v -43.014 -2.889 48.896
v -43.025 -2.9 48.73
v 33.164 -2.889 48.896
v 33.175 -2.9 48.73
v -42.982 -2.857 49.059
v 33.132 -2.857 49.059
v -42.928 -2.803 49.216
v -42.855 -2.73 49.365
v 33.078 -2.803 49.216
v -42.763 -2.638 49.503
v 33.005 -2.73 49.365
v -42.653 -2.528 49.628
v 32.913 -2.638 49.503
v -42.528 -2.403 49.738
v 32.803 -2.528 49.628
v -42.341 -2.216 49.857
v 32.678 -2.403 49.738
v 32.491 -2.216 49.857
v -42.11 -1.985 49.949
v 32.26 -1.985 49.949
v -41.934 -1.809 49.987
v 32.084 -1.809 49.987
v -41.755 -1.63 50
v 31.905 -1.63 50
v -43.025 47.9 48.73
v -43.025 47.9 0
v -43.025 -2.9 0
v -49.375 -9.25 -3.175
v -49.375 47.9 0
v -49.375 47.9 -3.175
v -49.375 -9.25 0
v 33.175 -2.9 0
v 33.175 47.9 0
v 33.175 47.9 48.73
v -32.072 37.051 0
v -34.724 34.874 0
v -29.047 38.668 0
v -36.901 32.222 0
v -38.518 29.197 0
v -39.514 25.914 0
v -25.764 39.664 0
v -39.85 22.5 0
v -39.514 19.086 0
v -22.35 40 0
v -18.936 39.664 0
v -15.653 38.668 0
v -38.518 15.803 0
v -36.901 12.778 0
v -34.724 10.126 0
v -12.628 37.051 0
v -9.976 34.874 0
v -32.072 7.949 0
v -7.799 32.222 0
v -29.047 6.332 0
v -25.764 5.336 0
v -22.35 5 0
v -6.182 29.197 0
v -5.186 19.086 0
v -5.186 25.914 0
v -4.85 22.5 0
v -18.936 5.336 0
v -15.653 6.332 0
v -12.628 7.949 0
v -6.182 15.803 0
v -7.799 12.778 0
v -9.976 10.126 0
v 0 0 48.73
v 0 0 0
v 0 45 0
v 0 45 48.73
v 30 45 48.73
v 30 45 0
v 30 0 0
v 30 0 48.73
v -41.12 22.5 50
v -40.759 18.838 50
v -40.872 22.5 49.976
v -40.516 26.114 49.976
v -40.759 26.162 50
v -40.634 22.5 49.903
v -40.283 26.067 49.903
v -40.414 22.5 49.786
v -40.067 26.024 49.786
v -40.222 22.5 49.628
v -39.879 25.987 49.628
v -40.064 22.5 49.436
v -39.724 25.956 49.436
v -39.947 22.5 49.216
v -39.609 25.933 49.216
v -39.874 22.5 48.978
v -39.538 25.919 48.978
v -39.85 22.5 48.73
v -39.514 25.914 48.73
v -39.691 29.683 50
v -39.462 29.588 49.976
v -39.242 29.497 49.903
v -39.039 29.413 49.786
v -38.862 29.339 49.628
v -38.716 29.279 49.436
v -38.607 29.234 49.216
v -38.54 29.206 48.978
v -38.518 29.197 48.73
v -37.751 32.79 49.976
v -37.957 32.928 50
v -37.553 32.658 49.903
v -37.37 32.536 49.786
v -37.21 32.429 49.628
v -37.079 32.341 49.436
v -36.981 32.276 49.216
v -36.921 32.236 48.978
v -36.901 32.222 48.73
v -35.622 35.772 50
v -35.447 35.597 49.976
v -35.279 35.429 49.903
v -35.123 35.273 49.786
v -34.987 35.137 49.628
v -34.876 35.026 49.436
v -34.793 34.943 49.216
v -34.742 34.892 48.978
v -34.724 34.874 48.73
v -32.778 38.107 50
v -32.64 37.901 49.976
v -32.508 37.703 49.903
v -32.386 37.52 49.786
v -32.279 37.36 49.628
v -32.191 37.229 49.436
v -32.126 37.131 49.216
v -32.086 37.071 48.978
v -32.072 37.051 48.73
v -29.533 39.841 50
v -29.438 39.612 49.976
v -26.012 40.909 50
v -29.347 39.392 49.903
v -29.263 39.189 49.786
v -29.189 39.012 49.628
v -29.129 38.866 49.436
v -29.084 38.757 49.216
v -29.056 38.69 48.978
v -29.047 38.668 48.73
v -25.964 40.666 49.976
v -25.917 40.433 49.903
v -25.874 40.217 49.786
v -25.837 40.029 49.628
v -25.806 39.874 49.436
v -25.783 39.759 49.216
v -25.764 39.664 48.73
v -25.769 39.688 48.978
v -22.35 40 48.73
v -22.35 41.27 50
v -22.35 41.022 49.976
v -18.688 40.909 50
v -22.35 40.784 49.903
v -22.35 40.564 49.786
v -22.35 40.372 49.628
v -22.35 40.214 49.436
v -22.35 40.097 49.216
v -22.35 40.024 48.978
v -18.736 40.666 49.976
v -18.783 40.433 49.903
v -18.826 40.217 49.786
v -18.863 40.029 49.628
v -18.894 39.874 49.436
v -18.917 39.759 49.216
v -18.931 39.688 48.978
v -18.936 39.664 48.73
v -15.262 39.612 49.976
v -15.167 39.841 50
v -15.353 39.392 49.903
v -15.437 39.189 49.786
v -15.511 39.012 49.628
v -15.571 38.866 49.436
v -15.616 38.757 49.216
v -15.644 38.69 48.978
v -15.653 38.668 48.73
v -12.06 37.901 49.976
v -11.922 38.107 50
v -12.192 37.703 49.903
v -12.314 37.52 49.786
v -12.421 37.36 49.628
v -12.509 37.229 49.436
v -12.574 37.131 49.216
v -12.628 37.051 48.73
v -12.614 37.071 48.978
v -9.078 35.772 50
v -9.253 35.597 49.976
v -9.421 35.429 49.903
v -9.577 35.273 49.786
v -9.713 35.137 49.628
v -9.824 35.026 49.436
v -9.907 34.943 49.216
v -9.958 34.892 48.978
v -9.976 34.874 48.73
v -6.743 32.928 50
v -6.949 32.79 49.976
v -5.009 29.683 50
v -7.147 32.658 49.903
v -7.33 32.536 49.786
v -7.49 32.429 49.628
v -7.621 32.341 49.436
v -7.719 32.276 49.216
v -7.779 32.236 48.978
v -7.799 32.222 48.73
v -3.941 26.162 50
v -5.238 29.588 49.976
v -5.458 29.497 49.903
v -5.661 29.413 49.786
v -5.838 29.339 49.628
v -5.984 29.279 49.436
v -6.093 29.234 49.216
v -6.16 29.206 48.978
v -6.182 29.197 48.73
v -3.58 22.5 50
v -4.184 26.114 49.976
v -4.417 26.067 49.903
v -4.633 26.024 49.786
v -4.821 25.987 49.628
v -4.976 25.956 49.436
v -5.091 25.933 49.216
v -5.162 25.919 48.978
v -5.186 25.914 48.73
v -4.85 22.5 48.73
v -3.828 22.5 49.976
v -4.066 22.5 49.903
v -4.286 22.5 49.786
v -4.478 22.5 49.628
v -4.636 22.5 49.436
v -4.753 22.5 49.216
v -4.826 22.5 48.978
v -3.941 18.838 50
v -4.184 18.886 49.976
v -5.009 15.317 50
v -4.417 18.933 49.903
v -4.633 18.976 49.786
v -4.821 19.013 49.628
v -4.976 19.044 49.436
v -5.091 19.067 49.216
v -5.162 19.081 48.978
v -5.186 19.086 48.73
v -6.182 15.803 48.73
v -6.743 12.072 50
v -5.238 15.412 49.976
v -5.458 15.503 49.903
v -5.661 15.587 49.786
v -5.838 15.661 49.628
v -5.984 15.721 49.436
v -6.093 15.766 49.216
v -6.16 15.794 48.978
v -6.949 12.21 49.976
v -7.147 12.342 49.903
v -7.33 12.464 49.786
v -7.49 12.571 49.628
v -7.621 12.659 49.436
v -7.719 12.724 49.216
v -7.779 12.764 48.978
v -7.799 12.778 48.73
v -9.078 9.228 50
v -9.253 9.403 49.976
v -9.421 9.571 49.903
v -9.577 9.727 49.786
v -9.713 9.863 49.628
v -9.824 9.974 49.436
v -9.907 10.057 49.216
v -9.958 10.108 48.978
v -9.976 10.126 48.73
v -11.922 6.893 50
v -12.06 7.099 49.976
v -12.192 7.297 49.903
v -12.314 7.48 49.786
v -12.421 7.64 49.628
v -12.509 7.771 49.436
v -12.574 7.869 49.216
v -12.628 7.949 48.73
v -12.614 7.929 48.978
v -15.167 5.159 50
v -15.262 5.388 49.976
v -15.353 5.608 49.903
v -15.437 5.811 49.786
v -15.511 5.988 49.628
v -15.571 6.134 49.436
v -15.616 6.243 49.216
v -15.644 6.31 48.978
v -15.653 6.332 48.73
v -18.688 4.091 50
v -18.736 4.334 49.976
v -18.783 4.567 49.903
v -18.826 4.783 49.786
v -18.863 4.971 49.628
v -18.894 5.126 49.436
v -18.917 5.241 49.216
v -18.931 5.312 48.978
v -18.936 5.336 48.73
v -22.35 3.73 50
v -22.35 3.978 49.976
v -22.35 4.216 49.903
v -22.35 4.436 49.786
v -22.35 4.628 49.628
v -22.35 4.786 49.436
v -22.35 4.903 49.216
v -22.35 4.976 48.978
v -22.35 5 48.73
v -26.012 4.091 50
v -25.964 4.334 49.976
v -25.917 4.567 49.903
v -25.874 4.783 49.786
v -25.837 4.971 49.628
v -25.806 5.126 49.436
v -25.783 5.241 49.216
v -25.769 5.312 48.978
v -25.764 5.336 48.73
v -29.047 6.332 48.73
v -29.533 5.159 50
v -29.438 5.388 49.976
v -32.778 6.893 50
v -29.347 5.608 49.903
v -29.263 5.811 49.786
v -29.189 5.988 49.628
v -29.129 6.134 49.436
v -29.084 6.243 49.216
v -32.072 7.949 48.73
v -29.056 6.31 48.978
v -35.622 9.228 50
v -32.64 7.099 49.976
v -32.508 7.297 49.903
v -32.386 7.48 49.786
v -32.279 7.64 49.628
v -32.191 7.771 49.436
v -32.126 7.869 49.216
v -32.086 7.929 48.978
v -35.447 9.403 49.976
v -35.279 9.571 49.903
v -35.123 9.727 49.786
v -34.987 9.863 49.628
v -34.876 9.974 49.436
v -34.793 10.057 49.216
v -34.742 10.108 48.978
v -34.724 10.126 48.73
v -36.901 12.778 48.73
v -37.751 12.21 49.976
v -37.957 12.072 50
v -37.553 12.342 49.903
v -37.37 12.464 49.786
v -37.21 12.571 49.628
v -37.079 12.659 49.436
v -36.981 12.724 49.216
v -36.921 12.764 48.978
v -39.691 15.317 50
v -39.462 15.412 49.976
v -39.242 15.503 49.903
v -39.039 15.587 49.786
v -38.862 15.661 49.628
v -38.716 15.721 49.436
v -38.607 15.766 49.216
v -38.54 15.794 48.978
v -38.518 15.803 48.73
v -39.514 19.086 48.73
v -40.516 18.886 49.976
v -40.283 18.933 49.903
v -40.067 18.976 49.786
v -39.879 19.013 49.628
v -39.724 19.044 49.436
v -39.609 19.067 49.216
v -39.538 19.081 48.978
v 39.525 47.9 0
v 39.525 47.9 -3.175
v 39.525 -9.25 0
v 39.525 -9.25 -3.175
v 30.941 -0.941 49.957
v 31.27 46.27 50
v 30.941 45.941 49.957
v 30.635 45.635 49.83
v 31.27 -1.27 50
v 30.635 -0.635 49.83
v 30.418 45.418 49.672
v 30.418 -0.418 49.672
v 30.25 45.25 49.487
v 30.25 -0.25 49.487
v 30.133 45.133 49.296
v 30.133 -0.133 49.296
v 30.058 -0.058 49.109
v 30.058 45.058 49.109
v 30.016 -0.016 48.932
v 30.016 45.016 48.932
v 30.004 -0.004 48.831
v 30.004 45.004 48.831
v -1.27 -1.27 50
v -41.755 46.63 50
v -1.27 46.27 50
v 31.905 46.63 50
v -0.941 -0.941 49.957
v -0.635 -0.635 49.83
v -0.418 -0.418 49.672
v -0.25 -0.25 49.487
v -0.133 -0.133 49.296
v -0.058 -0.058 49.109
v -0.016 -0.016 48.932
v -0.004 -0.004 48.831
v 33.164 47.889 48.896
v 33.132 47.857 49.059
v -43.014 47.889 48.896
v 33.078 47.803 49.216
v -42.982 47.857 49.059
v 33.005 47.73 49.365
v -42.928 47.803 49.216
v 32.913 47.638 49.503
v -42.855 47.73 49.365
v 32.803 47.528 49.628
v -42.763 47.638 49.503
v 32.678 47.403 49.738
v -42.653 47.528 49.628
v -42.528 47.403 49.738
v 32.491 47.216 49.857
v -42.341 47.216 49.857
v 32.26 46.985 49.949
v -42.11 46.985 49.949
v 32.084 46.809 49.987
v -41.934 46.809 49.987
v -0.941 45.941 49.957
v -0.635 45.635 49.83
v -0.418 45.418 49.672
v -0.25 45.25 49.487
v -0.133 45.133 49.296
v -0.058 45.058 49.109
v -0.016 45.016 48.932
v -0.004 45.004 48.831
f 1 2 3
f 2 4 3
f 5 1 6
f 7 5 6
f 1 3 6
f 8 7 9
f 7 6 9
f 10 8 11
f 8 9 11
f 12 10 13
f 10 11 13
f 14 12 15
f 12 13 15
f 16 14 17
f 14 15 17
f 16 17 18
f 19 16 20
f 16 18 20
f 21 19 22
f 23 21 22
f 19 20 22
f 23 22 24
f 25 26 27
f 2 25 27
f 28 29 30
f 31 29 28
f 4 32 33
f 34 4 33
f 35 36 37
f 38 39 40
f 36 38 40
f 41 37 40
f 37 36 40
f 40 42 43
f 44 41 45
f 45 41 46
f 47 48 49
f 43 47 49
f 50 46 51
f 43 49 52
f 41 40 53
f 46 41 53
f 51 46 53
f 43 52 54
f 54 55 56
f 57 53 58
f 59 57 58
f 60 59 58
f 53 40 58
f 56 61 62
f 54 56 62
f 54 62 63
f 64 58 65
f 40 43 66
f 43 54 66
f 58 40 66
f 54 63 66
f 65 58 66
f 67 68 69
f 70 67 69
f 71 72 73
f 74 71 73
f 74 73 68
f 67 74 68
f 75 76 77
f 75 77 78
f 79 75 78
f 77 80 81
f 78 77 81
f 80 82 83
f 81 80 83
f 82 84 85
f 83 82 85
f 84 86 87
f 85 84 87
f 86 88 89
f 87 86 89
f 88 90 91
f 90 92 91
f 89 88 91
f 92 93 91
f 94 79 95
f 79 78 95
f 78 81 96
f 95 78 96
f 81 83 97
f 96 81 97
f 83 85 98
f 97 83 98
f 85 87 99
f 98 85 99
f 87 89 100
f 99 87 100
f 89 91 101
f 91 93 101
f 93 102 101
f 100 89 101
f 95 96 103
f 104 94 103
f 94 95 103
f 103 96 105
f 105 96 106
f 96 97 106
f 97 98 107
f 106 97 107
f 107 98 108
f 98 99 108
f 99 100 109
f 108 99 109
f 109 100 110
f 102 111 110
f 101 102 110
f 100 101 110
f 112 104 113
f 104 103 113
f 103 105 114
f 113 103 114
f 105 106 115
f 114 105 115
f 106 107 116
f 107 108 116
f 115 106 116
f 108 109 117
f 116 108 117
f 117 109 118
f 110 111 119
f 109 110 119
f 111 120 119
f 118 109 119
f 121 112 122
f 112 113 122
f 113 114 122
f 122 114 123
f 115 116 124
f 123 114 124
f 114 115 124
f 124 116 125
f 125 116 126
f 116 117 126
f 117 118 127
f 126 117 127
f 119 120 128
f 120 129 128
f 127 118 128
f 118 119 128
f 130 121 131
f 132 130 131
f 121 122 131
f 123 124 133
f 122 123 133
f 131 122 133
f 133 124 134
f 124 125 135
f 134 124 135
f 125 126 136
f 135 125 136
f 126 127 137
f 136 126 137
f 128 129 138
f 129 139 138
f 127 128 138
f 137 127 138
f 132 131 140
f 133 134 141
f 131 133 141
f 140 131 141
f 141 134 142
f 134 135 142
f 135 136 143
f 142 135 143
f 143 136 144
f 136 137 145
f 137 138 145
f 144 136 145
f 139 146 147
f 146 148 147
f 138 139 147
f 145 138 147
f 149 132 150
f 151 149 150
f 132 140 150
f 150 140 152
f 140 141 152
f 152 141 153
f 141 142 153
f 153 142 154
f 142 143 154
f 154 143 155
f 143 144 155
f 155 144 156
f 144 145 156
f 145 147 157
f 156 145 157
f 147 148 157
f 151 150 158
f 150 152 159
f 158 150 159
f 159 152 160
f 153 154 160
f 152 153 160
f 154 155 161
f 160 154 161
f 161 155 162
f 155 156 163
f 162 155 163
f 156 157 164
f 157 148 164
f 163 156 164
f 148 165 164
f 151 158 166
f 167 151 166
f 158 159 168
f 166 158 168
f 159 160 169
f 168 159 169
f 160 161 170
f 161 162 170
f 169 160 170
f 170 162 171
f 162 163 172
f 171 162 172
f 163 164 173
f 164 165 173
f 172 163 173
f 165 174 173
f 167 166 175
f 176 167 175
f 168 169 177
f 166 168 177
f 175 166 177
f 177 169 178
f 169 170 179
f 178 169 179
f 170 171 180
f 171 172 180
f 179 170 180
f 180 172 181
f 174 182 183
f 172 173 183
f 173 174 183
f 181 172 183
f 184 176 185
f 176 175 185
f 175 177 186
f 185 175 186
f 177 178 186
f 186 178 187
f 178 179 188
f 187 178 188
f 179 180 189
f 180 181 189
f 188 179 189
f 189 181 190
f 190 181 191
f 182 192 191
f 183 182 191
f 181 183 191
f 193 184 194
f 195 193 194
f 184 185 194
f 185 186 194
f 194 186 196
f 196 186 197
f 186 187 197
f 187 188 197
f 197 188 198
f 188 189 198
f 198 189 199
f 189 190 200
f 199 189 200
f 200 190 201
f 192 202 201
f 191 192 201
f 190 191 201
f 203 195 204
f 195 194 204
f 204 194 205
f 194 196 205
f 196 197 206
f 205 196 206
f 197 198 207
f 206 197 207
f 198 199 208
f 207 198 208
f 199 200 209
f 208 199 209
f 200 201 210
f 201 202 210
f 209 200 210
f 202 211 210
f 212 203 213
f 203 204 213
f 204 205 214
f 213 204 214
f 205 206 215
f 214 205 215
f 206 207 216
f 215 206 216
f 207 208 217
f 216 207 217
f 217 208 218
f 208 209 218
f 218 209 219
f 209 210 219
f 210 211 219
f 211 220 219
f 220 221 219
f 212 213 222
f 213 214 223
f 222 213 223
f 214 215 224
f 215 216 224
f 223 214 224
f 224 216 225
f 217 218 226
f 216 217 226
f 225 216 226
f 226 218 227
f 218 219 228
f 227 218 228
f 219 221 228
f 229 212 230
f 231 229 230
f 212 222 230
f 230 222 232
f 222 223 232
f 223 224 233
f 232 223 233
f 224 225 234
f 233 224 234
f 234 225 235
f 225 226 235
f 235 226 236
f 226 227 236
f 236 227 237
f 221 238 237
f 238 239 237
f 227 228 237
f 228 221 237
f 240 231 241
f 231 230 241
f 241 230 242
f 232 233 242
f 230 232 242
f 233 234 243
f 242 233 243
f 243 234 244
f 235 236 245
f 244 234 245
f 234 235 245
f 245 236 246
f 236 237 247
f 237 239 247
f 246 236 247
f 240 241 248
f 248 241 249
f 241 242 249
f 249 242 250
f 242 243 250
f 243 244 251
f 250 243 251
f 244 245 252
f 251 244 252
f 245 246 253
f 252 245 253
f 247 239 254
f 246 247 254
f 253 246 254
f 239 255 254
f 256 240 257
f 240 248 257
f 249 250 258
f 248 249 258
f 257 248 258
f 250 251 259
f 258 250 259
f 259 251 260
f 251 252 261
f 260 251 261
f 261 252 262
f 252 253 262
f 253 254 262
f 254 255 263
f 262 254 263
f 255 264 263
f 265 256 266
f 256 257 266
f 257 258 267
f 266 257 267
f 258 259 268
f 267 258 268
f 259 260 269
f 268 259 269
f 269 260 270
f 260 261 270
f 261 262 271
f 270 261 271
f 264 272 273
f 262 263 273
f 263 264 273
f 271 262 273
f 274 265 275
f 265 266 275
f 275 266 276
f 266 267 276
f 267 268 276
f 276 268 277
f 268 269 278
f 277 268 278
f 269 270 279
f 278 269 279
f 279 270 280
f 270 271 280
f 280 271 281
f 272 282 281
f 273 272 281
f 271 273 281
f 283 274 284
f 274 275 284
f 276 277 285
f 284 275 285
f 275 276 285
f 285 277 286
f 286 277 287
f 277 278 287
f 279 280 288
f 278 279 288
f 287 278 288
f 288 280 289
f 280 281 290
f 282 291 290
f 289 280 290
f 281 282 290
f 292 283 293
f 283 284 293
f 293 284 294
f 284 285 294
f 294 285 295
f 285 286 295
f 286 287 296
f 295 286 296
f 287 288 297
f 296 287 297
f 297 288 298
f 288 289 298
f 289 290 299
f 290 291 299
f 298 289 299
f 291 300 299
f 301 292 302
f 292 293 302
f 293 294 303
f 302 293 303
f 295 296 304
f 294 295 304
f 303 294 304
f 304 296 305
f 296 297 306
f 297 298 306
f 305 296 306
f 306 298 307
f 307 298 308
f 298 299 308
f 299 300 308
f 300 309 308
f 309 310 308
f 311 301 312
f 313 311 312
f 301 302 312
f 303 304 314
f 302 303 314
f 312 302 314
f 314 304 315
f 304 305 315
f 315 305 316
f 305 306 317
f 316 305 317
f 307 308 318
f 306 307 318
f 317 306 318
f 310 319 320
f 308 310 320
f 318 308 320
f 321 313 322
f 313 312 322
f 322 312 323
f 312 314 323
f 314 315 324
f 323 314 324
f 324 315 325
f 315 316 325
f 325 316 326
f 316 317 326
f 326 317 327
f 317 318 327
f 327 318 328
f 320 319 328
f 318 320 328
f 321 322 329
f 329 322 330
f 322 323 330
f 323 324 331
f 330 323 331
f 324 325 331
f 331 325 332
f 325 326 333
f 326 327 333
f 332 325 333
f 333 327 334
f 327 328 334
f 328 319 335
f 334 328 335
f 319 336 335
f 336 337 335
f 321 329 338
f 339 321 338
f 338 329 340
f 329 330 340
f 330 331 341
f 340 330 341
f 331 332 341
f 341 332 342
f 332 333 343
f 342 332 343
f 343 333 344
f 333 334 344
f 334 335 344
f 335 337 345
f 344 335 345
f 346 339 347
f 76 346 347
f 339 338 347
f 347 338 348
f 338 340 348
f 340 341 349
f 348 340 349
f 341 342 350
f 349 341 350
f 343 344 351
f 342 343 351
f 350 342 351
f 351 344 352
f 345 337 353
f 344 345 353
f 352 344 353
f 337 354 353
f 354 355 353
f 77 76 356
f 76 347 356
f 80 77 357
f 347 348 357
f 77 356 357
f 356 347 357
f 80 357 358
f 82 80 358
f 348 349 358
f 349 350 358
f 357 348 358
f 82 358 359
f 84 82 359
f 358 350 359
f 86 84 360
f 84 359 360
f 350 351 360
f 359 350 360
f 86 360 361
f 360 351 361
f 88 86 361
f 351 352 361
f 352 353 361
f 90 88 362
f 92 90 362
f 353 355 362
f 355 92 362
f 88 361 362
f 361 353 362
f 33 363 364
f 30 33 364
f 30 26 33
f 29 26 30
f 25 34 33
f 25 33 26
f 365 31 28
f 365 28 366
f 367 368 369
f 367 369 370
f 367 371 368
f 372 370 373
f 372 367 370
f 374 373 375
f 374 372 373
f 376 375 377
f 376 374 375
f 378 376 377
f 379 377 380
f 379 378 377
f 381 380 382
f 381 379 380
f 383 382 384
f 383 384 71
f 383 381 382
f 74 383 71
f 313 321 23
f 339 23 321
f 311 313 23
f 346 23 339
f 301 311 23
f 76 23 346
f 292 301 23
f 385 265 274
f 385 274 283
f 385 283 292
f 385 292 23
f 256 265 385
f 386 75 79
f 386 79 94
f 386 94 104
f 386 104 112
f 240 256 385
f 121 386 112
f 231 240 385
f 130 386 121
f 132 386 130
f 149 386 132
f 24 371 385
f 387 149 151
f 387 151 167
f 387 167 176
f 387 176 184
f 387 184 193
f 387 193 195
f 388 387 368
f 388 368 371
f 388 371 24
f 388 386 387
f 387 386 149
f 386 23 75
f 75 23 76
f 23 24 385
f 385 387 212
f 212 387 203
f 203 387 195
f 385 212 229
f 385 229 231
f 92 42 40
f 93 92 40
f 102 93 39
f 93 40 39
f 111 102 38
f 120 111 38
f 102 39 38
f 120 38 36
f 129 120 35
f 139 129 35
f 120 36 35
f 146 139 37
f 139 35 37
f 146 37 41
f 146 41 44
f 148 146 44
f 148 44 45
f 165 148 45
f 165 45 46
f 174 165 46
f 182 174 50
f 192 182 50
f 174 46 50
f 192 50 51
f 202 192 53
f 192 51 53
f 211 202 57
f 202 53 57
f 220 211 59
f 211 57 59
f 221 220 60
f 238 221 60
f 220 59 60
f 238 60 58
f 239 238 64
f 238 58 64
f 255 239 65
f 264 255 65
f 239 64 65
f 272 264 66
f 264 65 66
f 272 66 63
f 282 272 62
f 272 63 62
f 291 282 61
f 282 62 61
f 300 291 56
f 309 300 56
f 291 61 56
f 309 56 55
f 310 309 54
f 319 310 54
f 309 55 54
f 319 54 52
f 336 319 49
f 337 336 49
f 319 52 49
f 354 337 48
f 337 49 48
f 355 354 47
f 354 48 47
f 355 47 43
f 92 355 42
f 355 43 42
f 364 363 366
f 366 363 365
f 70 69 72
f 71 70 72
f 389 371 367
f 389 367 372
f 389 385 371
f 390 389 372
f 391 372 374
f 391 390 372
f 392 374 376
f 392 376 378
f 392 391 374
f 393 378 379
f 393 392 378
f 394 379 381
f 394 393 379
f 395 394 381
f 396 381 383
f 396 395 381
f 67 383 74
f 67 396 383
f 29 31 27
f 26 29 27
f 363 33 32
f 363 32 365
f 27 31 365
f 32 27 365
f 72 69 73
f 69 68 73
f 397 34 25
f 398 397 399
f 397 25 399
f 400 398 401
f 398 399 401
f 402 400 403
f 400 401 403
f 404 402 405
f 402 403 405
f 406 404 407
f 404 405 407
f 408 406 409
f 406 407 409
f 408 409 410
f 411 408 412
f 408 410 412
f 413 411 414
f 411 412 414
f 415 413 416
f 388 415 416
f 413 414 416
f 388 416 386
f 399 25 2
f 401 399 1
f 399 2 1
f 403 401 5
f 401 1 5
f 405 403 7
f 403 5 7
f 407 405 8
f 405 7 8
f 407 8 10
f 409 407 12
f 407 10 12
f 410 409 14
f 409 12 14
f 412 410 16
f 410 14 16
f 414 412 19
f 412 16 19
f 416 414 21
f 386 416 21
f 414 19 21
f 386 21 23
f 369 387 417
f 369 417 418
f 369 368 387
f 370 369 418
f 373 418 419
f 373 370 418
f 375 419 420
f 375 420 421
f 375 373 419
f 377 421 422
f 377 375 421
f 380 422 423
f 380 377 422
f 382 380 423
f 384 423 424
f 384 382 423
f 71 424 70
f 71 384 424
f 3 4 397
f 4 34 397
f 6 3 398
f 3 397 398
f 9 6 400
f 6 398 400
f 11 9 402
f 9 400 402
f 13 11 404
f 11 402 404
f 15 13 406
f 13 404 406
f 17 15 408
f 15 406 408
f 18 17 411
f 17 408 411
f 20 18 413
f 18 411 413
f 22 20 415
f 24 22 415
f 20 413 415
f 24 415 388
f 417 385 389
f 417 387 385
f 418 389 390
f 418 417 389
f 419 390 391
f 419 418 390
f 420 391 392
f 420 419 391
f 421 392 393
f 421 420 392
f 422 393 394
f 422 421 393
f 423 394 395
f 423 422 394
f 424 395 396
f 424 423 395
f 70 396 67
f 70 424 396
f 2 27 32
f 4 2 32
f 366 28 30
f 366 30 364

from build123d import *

# Parameters (mm, degrees)
F1_DEPTH = 50
F2_W     = 88.9
F2_H     = 63.5
F2_W_2   = 76.2
F2_H_2   = 50.8
F2_R     = 17.5
F2_W_3   = 30
F2_H_3   = 45
F3_DEPTH = 3.175
F4_W     = 442.8342580795
F4_H     = 256.8548172712
F5_DEPTH = 25.4
F6_R     = 1.27


with BuildPart() as f1:
    # F0 (on Top) → F1 (new body)
    with BuildSketch(Plane.XY):
        Polygon((33.175, -2.9), (33.175, 22.5), (33.175, 47.9), (-43.025, 47.9), (-43.025, 22.5), (-43.025, -2.9), align=None)
        with BuildLine():
            ThreePointArc((-4.85, 22.5), (-22.35, 5), (-39.85, 22.5))
            ThreePointArc((-39.85, 22.5), (-22.35, 40), (-4.85, 22.5))
        make_face(mode=Mode.SUBTRACT)
        Polygon((30, 0), (0, 0), (0, 45), (30, 45), (30, 22.5), align=None, mode=Mode.SUBTRACT)
    extrude(amount=F1_DEPTH)

    # F2 (on face) → F3 (join)
    with BuildSketch(Plane(origin=(0, 0, 0), x_dir=(1, 0, 0), z_dir=(0, 0, -1))):
        with Locations((-4.925, -22.5)):
            Rectangle(F2_W, F2_H)
        with Locations((-4.925, -22.5)):
            Rectangle(F2_W_2, F2_H_2, mode=Mode.SUBTRACT)
        with Locations((-4.925, -22.5)):
            Rectangle(F2_W_2, F2_H_2)
        with Locations((-22.35, -22.5)):
            Circle(F2_R, mode=Mode.SUBTRACT)
        with Locations((15, -22.5)):
            Rectangle(F2_W_3, F2_H_3, mode=Mode.SUBTRACT)
        with Locations((-22.35, -22.5)):
            Circle(F2_R)
        with Locations((15, -22.5)):
            Rectangle(F2_W_3, F2_H_3)
    extrude(amount=F3_DEPTH)

    # F4 (on face) → F5 (cut)
    with BuildSketch(Plane(origin=(0, 47.9, 0), x_dir=(-1, 0, 0), z_dir=(0, 1, 0))):
        with Locations((25.4539847374, 21.782644093)):
            Rectangle(F4_W, F4_H)
    extrude(amount=F5_DEPTH, mode=Mode.SUBTRACT)

    # F6
    f6_edges = [f1.edges().sort_by_distance(p)[0] for p in [
        (0, 22.5, 50),
        (33.175, 22.5, 50),
        (-4.925, 47.9, 50),
        (-43.025, 22.5, 50),
        (-4.925, -2.9, 50),
        (-39.85, 22.5, 50),
        (15, 0, 50),
        (15, 45, 50),
        (30, 22.5, 50),
    ]]
    fillet(f6_edges, radius=F6_R)


solid = f1.part
